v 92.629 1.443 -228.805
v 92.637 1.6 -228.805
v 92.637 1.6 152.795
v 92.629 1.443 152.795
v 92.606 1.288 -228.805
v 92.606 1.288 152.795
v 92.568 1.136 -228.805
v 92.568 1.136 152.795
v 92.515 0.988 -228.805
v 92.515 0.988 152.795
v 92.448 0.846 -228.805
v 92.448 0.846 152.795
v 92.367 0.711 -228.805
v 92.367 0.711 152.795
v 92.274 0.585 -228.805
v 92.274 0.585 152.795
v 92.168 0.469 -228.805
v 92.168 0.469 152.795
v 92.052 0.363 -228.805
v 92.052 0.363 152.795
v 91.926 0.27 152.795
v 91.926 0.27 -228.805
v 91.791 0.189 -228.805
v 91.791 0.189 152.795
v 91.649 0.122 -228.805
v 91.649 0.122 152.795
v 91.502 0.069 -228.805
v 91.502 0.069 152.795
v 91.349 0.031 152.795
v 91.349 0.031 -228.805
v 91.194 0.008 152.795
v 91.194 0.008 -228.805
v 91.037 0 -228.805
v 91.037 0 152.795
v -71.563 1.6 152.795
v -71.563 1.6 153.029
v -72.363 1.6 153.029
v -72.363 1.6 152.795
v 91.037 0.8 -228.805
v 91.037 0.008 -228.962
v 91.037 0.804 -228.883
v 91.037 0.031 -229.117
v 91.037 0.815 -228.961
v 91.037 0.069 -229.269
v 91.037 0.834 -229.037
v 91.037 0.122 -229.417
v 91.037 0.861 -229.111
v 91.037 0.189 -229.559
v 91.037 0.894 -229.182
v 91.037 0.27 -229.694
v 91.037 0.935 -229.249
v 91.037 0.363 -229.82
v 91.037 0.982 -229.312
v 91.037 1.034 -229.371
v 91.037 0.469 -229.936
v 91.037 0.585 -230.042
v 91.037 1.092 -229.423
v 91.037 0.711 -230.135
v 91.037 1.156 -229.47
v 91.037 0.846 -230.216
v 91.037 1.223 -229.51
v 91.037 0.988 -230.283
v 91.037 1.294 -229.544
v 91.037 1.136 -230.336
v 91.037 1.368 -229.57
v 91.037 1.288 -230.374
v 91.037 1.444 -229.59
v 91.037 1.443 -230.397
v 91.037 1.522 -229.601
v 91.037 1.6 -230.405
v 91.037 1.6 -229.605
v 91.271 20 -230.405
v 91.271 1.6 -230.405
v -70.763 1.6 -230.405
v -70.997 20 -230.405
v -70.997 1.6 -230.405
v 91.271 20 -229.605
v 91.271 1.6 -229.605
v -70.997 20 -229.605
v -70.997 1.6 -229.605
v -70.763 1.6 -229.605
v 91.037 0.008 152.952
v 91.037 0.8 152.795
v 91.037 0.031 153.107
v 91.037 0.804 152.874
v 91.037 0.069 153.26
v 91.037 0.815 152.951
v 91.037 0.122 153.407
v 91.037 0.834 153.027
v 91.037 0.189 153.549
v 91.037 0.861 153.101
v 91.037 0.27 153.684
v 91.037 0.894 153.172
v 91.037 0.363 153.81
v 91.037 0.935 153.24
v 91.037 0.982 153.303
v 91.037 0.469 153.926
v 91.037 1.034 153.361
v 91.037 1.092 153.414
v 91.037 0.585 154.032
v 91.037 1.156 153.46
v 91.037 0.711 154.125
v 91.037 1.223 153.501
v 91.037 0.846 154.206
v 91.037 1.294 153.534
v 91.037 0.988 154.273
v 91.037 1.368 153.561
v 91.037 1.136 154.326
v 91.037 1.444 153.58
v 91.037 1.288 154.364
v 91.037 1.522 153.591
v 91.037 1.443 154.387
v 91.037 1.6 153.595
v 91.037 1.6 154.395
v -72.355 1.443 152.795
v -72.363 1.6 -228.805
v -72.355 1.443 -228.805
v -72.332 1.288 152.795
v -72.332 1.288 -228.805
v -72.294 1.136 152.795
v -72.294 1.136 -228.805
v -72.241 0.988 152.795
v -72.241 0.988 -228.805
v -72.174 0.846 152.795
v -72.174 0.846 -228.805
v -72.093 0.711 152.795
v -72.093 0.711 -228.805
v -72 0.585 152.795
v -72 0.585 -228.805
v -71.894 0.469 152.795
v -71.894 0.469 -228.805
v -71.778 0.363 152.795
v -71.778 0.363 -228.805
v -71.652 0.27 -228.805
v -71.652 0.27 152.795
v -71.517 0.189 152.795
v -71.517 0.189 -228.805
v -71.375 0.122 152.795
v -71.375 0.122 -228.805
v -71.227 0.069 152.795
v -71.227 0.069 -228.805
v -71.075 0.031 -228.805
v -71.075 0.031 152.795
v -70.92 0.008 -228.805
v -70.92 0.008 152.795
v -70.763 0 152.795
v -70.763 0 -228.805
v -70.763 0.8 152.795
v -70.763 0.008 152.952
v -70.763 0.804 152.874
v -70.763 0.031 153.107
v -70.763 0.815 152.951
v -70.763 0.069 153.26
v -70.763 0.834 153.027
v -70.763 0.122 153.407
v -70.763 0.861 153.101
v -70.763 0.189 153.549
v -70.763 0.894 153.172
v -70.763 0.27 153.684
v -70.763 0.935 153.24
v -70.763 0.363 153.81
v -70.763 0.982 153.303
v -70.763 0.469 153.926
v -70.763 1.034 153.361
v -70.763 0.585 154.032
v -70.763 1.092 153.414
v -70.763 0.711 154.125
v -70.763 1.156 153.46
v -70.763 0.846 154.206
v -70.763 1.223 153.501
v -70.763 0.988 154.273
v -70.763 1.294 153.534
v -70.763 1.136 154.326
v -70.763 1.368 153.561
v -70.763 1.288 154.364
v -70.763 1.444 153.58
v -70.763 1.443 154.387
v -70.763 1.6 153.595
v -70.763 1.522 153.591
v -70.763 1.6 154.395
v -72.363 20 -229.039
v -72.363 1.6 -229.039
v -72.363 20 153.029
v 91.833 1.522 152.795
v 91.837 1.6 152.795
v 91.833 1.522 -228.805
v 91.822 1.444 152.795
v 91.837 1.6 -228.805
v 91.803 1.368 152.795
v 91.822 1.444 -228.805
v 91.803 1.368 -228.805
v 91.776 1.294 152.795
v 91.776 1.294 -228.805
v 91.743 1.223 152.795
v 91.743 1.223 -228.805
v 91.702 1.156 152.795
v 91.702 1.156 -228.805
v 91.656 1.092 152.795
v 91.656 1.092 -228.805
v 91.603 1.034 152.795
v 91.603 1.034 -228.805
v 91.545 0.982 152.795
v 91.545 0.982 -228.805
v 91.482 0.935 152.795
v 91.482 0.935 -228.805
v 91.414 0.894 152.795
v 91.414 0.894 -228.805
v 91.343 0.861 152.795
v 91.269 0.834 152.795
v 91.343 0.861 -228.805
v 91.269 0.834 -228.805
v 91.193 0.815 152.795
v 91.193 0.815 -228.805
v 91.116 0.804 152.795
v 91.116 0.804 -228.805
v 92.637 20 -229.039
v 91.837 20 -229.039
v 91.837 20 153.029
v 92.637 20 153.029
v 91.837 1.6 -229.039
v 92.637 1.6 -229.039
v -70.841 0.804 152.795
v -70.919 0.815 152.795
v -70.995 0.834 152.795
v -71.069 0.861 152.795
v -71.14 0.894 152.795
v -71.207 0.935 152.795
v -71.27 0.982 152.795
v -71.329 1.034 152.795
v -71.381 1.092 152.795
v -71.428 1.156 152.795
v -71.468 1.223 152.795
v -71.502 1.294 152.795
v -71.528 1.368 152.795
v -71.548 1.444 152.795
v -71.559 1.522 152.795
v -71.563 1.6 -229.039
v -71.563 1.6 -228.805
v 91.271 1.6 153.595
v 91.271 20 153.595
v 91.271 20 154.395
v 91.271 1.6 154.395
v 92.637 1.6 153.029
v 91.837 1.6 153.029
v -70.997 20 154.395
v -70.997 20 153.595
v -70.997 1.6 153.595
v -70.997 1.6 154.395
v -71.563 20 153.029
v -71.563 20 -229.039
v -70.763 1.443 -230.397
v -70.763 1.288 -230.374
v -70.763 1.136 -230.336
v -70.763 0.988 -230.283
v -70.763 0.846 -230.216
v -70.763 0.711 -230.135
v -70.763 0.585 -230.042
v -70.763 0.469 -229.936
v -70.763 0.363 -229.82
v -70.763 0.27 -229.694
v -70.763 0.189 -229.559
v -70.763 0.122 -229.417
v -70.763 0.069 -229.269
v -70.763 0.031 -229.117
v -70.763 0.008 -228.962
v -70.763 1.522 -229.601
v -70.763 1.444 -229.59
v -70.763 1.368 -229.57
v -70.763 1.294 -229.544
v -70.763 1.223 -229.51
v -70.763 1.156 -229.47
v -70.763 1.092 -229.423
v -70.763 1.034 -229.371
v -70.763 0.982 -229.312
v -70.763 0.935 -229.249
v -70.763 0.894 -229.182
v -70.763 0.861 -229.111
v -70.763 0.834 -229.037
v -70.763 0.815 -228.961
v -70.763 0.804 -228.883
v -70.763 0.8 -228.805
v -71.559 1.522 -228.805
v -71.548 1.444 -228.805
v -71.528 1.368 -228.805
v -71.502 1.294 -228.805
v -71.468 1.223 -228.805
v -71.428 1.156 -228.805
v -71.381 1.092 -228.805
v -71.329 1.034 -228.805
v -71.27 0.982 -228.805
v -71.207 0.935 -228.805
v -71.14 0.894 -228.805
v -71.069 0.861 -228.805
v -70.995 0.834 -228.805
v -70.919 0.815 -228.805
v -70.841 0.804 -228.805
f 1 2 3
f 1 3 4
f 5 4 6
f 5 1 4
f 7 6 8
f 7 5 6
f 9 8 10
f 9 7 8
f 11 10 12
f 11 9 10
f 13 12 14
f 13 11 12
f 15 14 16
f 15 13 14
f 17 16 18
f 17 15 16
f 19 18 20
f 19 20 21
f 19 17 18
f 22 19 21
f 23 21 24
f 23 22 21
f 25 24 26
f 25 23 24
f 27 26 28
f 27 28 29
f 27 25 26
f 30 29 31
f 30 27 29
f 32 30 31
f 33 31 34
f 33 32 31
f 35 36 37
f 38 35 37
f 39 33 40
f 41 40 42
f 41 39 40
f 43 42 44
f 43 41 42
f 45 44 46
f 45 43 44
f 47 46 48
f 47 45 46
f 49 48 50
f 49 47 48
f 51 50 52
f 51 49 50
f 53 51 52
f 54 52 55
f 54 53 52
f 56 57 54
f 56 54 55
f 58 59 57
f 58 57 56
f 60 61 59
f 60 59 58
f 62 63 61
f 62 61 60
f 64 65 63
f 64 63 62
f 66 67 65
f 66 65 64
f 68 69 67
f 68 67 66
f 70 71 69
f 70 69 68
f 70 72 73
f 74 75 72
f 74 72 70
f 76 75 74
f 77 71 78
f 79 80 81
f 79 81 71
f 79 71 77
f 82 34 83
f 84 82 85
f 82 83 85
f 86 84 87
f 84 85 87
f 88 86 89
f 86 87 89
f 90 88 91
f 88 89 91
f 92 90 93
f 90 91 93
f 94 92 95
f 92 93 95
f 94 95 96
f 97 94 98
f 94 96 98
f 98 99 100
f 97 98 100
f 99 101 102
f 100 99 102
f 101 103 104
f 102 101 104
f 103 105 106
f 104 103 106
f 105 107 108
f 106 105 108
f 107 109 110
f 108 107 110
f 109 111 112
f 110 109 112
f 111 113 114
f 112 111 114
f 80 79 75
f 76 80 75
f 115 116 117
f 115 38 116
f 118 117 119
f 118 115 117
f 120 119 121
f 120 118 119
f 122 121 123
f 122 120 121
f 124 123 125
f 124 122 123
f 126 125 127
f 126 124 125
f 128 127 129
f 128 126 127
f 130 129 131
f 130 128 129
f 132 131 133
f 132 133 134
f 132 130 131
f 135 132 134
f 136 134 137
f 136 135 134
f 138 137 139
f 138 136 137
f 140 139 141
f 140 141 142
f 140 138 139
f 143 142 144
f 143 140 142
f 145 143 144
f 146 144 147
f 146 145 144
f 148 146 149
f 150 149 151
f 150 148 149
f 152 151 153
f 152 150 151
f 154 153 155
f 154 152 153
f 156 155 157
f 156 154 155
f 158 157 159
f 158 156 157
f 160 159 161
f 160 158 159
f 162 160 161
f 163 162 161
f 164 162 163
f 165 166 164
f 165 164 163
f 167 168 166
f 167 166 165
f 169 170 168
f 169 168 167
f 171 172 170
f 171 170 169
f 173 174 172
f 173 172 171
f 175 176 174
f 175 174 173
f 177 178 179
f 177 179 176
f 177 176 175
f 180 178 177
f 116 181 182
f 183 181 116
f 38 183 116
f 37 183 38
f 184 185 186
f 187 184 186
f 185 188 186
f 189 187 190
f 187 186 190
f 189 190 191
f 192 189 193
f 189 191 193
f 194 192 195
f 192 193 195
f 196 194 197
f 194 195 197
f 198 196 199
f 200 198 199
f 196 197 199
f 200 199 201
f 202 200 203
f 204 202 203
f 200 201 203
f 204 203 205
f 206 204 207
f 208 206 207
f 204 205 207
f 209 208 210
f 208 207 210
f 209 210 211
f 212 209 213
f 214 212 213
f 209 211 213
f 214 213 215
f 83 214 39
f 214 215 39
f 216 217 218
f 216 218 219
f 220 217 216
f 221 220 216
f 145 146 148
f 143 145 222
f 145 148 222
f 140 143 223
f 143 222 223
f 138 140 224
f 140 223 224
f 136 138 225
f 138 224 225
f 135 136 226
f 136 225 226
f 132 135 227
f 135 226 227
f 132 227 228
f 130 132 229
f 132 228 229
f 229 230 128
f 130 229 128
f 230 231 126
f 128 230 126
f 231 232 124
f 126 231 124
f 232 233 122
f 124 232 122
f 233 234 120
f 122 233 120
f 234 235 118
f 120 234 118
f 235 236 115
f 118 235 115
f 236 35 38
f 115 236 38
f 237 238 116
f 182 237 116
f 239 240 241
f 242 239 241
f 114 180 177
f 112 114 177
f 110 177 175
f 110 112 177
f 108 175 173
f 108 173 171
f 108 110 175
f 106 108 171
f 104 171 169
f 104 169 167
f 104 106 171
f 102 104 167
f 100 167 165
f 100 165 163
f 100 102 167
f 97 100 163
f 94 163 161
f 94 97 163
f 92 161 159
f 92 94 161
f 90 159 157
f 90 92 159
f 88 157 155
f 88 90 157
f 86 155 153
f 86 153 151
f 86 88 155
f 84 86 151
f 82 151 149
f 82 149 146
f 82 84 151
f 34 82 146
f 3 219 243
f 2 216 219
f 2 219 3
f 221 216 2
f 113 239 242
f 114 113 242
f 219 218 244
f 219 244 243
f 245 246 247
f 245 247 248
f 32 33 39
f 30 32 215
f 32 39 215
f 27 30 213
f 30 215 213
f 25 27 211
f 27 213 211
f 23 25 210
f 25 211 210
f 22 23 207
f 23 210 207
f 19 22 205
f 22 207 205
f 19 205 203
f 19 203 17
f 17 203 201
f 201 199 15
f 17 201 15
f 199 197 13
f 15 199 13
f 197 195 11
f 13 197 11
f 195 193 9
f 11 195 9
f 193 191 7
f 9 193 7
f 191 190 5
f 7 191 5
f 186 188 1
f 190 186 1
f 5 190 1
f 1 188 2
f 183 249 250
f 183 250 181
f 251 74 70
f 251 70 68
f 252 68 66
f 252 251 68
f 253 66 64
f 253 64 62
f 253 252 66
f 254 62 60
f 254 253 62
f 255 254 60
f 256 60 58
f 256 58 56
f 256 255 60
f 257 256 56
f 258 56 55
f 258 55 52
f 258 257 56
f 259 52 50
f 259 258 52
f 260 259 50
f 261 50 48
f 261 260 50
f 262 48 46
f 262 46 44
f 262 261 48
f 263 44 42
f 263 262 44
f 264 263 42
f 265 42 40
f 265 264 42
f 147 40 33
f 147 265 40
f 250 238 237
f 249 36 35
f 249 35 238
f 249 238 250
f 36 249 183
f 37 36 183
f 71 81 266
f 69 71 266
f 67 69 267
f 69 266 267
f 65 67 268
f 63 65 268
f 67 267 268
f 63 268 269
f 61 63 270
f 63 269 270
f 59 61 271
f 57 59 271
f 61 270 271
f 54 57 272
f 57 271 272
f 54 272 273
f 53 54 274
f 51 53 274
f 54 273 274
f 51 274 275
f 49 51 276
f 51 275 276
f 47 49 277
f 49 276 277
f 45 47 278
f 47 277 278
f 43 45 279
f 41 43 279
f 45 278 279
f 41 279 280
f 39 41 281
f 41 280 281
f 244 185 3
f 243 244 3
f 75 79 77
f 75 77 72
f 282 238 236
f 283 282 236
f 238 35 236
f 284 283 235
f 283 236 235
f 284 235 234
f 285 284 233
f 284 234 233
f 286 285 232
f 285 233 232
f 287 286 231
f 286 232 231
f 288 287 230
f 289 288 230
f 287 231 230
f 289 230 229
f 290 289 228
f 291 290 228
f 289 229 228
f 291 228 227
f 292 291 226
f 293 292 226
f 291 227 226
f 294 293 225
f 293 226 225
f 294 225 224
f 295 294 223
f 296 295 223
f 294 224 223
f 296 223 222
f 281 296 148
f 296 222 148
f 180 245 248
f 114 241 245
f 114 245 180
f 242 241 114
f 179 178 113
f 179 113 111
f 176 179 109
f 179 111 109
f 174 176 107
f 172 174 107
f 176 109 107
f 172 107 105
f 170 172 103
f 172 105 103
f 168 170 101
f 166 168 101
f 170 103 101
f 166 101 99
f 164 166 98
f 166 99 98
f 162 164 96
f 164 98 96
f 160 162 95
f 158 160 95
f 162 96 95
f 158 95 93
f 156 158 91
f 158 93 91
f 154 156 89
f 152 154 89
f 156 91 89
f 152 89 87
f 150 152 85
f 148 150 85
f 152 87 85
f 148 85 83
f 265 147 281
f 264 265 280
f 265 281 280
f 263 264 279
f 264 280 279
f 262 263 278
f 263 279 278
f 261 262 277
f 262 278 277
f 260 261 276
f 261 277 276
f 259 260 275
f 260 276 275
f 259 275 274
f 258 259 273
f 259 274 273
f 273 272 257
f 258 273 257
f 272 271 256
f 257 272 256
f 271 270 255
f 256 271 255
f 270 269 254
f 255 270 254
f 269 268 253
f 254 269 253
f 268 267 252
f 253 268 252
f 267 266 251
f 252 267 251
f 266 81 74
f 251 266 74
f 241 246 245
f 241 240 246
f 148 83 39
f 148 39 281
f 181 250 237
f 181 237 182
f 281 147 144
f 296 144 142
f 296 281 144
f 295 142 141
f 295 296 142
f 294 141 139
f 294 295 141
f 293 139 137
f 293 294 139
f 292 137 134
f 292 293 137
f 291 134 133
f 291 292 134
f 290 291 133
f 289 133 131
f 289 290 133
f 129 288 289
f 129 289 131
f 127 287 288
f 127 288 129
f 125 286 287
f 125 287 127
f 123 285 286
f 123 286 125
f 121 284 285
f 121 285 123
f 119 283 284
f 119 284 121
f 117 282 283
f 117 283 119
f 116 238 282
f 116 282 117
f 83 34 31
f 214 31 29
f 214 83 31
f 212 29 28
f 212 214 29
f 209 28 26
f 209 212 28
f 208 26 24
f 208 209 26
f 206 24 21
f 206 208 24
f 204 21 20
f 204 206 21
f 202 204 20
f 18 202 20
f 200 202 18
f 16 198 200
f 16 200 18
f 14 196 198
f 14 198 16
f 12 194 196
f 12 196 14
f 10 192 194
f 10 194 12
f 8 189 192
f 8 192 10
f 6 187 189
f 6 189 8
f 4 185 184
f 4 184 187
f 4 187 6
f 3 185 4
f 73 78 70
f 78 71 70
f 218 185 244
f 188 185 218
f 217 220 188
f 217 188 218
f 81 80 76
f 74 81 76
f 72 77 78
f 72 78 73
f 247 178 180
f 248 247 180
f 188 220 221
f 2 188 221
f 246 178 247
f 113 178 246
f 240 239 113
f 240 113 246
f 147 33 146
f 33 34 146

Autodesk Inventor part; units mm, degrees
ref_plane "YZ Plane" through (0, 0, 0) normal (1, 0, 0) x (0, 1, 0)
ref_plane "XZ Plane" through (0, 0, 0) normal (0, 1, 0) x (-1, 0, 0)
ref_plane "XY Plane" through (0, 0, 0) normal (0, 0, 1) x (1, 0, 0)
sketch "Sketch1" plane through (0, 0, 0) normal (0, 1, 0) x (-1, 0, 0)
  line L0 (72.3629, 154.3951) -> (-92.6371, 154.3951)
  line L1 (-92.6371, 154.3951) -> (-92.6371, -230.4049)
  line L2 (-92.6371, -230.4049) -> (72.3629, -230.4049)
  line L3 (72.3629, -230.4049) -> (72.3629, 154.3951)
  point P0 (0, 0)
  dimension "d0" = 165
  dimension "d1" = 384.8
extrude "Plate1" add sketch "Sketch1" along normal blind 0.8
sketch "Sketch2" plane through (92.6371, 0, 153.5951) normal (0, 0, 1) x (1, 0, 0)
  line L0 (-165, 0) -> (0, 0)
  line L1 (0, 0) -> (0, 20)
  line L2 (0, 20) -> (-165, 20)
  line L3 (-165, 20) -> (-165, 0)
edge flange "Flange1" height 20 angle 90 thickness 0.8 bend radius 0.8 thickness toward (0, 0, 1) relief tear relief width 0.8 relief depth 0.4 corner gap 0.8 corner form 2 edges at (10.1371, 0.8, 154.3951) (-72.3629, 0.8, -38.0049) (92.6371, 0.8, -38.0049) (10.1371, 0.8, -230.4049) wall of the first edge with corners at (-72.3629, 0, 153.5951) (92.6371, 0, 153.5951) (92.6371, 20, 153.5951) (-72.3629, 20, 153.5951)
bend "Bend1"
corner "Corner1"
equation "\"d2\" = Thickness"
equation "\"d3\" = BendReliefWidth"
equation "\"d4\" = BendReliefDepth"
equation "\"d5\" = MinimumRemnant"
equation "\"d6\" = TransitionRadius"
equation "\"d9\" = BendRadius"
equation "\"d10\" = CornerReliefSize"
equation "\"d11\" = GapSize"
equation "\"d12\" = JacobiRadiusSize"
equation "\"BendRadius\" = Thickness"
equation "\"BendReliefWidth\" = Thickness"
equation "\"BendReliefDepth\" = 0.5 * Thickness"
equation "\"CornerReliefSize\" = 4 * Thickness"
equation "\"MinimumRemnant\" = 2 * Thickness"
equation "\"TransitionRadius\" = BendRadius"
equation "\"JacobiRadiusSize\" = BendRadius"
equation "\"GapSize\" = Thickness"
equation "\"Thickness\" = 0.8"
properties part number "Back_plate"
